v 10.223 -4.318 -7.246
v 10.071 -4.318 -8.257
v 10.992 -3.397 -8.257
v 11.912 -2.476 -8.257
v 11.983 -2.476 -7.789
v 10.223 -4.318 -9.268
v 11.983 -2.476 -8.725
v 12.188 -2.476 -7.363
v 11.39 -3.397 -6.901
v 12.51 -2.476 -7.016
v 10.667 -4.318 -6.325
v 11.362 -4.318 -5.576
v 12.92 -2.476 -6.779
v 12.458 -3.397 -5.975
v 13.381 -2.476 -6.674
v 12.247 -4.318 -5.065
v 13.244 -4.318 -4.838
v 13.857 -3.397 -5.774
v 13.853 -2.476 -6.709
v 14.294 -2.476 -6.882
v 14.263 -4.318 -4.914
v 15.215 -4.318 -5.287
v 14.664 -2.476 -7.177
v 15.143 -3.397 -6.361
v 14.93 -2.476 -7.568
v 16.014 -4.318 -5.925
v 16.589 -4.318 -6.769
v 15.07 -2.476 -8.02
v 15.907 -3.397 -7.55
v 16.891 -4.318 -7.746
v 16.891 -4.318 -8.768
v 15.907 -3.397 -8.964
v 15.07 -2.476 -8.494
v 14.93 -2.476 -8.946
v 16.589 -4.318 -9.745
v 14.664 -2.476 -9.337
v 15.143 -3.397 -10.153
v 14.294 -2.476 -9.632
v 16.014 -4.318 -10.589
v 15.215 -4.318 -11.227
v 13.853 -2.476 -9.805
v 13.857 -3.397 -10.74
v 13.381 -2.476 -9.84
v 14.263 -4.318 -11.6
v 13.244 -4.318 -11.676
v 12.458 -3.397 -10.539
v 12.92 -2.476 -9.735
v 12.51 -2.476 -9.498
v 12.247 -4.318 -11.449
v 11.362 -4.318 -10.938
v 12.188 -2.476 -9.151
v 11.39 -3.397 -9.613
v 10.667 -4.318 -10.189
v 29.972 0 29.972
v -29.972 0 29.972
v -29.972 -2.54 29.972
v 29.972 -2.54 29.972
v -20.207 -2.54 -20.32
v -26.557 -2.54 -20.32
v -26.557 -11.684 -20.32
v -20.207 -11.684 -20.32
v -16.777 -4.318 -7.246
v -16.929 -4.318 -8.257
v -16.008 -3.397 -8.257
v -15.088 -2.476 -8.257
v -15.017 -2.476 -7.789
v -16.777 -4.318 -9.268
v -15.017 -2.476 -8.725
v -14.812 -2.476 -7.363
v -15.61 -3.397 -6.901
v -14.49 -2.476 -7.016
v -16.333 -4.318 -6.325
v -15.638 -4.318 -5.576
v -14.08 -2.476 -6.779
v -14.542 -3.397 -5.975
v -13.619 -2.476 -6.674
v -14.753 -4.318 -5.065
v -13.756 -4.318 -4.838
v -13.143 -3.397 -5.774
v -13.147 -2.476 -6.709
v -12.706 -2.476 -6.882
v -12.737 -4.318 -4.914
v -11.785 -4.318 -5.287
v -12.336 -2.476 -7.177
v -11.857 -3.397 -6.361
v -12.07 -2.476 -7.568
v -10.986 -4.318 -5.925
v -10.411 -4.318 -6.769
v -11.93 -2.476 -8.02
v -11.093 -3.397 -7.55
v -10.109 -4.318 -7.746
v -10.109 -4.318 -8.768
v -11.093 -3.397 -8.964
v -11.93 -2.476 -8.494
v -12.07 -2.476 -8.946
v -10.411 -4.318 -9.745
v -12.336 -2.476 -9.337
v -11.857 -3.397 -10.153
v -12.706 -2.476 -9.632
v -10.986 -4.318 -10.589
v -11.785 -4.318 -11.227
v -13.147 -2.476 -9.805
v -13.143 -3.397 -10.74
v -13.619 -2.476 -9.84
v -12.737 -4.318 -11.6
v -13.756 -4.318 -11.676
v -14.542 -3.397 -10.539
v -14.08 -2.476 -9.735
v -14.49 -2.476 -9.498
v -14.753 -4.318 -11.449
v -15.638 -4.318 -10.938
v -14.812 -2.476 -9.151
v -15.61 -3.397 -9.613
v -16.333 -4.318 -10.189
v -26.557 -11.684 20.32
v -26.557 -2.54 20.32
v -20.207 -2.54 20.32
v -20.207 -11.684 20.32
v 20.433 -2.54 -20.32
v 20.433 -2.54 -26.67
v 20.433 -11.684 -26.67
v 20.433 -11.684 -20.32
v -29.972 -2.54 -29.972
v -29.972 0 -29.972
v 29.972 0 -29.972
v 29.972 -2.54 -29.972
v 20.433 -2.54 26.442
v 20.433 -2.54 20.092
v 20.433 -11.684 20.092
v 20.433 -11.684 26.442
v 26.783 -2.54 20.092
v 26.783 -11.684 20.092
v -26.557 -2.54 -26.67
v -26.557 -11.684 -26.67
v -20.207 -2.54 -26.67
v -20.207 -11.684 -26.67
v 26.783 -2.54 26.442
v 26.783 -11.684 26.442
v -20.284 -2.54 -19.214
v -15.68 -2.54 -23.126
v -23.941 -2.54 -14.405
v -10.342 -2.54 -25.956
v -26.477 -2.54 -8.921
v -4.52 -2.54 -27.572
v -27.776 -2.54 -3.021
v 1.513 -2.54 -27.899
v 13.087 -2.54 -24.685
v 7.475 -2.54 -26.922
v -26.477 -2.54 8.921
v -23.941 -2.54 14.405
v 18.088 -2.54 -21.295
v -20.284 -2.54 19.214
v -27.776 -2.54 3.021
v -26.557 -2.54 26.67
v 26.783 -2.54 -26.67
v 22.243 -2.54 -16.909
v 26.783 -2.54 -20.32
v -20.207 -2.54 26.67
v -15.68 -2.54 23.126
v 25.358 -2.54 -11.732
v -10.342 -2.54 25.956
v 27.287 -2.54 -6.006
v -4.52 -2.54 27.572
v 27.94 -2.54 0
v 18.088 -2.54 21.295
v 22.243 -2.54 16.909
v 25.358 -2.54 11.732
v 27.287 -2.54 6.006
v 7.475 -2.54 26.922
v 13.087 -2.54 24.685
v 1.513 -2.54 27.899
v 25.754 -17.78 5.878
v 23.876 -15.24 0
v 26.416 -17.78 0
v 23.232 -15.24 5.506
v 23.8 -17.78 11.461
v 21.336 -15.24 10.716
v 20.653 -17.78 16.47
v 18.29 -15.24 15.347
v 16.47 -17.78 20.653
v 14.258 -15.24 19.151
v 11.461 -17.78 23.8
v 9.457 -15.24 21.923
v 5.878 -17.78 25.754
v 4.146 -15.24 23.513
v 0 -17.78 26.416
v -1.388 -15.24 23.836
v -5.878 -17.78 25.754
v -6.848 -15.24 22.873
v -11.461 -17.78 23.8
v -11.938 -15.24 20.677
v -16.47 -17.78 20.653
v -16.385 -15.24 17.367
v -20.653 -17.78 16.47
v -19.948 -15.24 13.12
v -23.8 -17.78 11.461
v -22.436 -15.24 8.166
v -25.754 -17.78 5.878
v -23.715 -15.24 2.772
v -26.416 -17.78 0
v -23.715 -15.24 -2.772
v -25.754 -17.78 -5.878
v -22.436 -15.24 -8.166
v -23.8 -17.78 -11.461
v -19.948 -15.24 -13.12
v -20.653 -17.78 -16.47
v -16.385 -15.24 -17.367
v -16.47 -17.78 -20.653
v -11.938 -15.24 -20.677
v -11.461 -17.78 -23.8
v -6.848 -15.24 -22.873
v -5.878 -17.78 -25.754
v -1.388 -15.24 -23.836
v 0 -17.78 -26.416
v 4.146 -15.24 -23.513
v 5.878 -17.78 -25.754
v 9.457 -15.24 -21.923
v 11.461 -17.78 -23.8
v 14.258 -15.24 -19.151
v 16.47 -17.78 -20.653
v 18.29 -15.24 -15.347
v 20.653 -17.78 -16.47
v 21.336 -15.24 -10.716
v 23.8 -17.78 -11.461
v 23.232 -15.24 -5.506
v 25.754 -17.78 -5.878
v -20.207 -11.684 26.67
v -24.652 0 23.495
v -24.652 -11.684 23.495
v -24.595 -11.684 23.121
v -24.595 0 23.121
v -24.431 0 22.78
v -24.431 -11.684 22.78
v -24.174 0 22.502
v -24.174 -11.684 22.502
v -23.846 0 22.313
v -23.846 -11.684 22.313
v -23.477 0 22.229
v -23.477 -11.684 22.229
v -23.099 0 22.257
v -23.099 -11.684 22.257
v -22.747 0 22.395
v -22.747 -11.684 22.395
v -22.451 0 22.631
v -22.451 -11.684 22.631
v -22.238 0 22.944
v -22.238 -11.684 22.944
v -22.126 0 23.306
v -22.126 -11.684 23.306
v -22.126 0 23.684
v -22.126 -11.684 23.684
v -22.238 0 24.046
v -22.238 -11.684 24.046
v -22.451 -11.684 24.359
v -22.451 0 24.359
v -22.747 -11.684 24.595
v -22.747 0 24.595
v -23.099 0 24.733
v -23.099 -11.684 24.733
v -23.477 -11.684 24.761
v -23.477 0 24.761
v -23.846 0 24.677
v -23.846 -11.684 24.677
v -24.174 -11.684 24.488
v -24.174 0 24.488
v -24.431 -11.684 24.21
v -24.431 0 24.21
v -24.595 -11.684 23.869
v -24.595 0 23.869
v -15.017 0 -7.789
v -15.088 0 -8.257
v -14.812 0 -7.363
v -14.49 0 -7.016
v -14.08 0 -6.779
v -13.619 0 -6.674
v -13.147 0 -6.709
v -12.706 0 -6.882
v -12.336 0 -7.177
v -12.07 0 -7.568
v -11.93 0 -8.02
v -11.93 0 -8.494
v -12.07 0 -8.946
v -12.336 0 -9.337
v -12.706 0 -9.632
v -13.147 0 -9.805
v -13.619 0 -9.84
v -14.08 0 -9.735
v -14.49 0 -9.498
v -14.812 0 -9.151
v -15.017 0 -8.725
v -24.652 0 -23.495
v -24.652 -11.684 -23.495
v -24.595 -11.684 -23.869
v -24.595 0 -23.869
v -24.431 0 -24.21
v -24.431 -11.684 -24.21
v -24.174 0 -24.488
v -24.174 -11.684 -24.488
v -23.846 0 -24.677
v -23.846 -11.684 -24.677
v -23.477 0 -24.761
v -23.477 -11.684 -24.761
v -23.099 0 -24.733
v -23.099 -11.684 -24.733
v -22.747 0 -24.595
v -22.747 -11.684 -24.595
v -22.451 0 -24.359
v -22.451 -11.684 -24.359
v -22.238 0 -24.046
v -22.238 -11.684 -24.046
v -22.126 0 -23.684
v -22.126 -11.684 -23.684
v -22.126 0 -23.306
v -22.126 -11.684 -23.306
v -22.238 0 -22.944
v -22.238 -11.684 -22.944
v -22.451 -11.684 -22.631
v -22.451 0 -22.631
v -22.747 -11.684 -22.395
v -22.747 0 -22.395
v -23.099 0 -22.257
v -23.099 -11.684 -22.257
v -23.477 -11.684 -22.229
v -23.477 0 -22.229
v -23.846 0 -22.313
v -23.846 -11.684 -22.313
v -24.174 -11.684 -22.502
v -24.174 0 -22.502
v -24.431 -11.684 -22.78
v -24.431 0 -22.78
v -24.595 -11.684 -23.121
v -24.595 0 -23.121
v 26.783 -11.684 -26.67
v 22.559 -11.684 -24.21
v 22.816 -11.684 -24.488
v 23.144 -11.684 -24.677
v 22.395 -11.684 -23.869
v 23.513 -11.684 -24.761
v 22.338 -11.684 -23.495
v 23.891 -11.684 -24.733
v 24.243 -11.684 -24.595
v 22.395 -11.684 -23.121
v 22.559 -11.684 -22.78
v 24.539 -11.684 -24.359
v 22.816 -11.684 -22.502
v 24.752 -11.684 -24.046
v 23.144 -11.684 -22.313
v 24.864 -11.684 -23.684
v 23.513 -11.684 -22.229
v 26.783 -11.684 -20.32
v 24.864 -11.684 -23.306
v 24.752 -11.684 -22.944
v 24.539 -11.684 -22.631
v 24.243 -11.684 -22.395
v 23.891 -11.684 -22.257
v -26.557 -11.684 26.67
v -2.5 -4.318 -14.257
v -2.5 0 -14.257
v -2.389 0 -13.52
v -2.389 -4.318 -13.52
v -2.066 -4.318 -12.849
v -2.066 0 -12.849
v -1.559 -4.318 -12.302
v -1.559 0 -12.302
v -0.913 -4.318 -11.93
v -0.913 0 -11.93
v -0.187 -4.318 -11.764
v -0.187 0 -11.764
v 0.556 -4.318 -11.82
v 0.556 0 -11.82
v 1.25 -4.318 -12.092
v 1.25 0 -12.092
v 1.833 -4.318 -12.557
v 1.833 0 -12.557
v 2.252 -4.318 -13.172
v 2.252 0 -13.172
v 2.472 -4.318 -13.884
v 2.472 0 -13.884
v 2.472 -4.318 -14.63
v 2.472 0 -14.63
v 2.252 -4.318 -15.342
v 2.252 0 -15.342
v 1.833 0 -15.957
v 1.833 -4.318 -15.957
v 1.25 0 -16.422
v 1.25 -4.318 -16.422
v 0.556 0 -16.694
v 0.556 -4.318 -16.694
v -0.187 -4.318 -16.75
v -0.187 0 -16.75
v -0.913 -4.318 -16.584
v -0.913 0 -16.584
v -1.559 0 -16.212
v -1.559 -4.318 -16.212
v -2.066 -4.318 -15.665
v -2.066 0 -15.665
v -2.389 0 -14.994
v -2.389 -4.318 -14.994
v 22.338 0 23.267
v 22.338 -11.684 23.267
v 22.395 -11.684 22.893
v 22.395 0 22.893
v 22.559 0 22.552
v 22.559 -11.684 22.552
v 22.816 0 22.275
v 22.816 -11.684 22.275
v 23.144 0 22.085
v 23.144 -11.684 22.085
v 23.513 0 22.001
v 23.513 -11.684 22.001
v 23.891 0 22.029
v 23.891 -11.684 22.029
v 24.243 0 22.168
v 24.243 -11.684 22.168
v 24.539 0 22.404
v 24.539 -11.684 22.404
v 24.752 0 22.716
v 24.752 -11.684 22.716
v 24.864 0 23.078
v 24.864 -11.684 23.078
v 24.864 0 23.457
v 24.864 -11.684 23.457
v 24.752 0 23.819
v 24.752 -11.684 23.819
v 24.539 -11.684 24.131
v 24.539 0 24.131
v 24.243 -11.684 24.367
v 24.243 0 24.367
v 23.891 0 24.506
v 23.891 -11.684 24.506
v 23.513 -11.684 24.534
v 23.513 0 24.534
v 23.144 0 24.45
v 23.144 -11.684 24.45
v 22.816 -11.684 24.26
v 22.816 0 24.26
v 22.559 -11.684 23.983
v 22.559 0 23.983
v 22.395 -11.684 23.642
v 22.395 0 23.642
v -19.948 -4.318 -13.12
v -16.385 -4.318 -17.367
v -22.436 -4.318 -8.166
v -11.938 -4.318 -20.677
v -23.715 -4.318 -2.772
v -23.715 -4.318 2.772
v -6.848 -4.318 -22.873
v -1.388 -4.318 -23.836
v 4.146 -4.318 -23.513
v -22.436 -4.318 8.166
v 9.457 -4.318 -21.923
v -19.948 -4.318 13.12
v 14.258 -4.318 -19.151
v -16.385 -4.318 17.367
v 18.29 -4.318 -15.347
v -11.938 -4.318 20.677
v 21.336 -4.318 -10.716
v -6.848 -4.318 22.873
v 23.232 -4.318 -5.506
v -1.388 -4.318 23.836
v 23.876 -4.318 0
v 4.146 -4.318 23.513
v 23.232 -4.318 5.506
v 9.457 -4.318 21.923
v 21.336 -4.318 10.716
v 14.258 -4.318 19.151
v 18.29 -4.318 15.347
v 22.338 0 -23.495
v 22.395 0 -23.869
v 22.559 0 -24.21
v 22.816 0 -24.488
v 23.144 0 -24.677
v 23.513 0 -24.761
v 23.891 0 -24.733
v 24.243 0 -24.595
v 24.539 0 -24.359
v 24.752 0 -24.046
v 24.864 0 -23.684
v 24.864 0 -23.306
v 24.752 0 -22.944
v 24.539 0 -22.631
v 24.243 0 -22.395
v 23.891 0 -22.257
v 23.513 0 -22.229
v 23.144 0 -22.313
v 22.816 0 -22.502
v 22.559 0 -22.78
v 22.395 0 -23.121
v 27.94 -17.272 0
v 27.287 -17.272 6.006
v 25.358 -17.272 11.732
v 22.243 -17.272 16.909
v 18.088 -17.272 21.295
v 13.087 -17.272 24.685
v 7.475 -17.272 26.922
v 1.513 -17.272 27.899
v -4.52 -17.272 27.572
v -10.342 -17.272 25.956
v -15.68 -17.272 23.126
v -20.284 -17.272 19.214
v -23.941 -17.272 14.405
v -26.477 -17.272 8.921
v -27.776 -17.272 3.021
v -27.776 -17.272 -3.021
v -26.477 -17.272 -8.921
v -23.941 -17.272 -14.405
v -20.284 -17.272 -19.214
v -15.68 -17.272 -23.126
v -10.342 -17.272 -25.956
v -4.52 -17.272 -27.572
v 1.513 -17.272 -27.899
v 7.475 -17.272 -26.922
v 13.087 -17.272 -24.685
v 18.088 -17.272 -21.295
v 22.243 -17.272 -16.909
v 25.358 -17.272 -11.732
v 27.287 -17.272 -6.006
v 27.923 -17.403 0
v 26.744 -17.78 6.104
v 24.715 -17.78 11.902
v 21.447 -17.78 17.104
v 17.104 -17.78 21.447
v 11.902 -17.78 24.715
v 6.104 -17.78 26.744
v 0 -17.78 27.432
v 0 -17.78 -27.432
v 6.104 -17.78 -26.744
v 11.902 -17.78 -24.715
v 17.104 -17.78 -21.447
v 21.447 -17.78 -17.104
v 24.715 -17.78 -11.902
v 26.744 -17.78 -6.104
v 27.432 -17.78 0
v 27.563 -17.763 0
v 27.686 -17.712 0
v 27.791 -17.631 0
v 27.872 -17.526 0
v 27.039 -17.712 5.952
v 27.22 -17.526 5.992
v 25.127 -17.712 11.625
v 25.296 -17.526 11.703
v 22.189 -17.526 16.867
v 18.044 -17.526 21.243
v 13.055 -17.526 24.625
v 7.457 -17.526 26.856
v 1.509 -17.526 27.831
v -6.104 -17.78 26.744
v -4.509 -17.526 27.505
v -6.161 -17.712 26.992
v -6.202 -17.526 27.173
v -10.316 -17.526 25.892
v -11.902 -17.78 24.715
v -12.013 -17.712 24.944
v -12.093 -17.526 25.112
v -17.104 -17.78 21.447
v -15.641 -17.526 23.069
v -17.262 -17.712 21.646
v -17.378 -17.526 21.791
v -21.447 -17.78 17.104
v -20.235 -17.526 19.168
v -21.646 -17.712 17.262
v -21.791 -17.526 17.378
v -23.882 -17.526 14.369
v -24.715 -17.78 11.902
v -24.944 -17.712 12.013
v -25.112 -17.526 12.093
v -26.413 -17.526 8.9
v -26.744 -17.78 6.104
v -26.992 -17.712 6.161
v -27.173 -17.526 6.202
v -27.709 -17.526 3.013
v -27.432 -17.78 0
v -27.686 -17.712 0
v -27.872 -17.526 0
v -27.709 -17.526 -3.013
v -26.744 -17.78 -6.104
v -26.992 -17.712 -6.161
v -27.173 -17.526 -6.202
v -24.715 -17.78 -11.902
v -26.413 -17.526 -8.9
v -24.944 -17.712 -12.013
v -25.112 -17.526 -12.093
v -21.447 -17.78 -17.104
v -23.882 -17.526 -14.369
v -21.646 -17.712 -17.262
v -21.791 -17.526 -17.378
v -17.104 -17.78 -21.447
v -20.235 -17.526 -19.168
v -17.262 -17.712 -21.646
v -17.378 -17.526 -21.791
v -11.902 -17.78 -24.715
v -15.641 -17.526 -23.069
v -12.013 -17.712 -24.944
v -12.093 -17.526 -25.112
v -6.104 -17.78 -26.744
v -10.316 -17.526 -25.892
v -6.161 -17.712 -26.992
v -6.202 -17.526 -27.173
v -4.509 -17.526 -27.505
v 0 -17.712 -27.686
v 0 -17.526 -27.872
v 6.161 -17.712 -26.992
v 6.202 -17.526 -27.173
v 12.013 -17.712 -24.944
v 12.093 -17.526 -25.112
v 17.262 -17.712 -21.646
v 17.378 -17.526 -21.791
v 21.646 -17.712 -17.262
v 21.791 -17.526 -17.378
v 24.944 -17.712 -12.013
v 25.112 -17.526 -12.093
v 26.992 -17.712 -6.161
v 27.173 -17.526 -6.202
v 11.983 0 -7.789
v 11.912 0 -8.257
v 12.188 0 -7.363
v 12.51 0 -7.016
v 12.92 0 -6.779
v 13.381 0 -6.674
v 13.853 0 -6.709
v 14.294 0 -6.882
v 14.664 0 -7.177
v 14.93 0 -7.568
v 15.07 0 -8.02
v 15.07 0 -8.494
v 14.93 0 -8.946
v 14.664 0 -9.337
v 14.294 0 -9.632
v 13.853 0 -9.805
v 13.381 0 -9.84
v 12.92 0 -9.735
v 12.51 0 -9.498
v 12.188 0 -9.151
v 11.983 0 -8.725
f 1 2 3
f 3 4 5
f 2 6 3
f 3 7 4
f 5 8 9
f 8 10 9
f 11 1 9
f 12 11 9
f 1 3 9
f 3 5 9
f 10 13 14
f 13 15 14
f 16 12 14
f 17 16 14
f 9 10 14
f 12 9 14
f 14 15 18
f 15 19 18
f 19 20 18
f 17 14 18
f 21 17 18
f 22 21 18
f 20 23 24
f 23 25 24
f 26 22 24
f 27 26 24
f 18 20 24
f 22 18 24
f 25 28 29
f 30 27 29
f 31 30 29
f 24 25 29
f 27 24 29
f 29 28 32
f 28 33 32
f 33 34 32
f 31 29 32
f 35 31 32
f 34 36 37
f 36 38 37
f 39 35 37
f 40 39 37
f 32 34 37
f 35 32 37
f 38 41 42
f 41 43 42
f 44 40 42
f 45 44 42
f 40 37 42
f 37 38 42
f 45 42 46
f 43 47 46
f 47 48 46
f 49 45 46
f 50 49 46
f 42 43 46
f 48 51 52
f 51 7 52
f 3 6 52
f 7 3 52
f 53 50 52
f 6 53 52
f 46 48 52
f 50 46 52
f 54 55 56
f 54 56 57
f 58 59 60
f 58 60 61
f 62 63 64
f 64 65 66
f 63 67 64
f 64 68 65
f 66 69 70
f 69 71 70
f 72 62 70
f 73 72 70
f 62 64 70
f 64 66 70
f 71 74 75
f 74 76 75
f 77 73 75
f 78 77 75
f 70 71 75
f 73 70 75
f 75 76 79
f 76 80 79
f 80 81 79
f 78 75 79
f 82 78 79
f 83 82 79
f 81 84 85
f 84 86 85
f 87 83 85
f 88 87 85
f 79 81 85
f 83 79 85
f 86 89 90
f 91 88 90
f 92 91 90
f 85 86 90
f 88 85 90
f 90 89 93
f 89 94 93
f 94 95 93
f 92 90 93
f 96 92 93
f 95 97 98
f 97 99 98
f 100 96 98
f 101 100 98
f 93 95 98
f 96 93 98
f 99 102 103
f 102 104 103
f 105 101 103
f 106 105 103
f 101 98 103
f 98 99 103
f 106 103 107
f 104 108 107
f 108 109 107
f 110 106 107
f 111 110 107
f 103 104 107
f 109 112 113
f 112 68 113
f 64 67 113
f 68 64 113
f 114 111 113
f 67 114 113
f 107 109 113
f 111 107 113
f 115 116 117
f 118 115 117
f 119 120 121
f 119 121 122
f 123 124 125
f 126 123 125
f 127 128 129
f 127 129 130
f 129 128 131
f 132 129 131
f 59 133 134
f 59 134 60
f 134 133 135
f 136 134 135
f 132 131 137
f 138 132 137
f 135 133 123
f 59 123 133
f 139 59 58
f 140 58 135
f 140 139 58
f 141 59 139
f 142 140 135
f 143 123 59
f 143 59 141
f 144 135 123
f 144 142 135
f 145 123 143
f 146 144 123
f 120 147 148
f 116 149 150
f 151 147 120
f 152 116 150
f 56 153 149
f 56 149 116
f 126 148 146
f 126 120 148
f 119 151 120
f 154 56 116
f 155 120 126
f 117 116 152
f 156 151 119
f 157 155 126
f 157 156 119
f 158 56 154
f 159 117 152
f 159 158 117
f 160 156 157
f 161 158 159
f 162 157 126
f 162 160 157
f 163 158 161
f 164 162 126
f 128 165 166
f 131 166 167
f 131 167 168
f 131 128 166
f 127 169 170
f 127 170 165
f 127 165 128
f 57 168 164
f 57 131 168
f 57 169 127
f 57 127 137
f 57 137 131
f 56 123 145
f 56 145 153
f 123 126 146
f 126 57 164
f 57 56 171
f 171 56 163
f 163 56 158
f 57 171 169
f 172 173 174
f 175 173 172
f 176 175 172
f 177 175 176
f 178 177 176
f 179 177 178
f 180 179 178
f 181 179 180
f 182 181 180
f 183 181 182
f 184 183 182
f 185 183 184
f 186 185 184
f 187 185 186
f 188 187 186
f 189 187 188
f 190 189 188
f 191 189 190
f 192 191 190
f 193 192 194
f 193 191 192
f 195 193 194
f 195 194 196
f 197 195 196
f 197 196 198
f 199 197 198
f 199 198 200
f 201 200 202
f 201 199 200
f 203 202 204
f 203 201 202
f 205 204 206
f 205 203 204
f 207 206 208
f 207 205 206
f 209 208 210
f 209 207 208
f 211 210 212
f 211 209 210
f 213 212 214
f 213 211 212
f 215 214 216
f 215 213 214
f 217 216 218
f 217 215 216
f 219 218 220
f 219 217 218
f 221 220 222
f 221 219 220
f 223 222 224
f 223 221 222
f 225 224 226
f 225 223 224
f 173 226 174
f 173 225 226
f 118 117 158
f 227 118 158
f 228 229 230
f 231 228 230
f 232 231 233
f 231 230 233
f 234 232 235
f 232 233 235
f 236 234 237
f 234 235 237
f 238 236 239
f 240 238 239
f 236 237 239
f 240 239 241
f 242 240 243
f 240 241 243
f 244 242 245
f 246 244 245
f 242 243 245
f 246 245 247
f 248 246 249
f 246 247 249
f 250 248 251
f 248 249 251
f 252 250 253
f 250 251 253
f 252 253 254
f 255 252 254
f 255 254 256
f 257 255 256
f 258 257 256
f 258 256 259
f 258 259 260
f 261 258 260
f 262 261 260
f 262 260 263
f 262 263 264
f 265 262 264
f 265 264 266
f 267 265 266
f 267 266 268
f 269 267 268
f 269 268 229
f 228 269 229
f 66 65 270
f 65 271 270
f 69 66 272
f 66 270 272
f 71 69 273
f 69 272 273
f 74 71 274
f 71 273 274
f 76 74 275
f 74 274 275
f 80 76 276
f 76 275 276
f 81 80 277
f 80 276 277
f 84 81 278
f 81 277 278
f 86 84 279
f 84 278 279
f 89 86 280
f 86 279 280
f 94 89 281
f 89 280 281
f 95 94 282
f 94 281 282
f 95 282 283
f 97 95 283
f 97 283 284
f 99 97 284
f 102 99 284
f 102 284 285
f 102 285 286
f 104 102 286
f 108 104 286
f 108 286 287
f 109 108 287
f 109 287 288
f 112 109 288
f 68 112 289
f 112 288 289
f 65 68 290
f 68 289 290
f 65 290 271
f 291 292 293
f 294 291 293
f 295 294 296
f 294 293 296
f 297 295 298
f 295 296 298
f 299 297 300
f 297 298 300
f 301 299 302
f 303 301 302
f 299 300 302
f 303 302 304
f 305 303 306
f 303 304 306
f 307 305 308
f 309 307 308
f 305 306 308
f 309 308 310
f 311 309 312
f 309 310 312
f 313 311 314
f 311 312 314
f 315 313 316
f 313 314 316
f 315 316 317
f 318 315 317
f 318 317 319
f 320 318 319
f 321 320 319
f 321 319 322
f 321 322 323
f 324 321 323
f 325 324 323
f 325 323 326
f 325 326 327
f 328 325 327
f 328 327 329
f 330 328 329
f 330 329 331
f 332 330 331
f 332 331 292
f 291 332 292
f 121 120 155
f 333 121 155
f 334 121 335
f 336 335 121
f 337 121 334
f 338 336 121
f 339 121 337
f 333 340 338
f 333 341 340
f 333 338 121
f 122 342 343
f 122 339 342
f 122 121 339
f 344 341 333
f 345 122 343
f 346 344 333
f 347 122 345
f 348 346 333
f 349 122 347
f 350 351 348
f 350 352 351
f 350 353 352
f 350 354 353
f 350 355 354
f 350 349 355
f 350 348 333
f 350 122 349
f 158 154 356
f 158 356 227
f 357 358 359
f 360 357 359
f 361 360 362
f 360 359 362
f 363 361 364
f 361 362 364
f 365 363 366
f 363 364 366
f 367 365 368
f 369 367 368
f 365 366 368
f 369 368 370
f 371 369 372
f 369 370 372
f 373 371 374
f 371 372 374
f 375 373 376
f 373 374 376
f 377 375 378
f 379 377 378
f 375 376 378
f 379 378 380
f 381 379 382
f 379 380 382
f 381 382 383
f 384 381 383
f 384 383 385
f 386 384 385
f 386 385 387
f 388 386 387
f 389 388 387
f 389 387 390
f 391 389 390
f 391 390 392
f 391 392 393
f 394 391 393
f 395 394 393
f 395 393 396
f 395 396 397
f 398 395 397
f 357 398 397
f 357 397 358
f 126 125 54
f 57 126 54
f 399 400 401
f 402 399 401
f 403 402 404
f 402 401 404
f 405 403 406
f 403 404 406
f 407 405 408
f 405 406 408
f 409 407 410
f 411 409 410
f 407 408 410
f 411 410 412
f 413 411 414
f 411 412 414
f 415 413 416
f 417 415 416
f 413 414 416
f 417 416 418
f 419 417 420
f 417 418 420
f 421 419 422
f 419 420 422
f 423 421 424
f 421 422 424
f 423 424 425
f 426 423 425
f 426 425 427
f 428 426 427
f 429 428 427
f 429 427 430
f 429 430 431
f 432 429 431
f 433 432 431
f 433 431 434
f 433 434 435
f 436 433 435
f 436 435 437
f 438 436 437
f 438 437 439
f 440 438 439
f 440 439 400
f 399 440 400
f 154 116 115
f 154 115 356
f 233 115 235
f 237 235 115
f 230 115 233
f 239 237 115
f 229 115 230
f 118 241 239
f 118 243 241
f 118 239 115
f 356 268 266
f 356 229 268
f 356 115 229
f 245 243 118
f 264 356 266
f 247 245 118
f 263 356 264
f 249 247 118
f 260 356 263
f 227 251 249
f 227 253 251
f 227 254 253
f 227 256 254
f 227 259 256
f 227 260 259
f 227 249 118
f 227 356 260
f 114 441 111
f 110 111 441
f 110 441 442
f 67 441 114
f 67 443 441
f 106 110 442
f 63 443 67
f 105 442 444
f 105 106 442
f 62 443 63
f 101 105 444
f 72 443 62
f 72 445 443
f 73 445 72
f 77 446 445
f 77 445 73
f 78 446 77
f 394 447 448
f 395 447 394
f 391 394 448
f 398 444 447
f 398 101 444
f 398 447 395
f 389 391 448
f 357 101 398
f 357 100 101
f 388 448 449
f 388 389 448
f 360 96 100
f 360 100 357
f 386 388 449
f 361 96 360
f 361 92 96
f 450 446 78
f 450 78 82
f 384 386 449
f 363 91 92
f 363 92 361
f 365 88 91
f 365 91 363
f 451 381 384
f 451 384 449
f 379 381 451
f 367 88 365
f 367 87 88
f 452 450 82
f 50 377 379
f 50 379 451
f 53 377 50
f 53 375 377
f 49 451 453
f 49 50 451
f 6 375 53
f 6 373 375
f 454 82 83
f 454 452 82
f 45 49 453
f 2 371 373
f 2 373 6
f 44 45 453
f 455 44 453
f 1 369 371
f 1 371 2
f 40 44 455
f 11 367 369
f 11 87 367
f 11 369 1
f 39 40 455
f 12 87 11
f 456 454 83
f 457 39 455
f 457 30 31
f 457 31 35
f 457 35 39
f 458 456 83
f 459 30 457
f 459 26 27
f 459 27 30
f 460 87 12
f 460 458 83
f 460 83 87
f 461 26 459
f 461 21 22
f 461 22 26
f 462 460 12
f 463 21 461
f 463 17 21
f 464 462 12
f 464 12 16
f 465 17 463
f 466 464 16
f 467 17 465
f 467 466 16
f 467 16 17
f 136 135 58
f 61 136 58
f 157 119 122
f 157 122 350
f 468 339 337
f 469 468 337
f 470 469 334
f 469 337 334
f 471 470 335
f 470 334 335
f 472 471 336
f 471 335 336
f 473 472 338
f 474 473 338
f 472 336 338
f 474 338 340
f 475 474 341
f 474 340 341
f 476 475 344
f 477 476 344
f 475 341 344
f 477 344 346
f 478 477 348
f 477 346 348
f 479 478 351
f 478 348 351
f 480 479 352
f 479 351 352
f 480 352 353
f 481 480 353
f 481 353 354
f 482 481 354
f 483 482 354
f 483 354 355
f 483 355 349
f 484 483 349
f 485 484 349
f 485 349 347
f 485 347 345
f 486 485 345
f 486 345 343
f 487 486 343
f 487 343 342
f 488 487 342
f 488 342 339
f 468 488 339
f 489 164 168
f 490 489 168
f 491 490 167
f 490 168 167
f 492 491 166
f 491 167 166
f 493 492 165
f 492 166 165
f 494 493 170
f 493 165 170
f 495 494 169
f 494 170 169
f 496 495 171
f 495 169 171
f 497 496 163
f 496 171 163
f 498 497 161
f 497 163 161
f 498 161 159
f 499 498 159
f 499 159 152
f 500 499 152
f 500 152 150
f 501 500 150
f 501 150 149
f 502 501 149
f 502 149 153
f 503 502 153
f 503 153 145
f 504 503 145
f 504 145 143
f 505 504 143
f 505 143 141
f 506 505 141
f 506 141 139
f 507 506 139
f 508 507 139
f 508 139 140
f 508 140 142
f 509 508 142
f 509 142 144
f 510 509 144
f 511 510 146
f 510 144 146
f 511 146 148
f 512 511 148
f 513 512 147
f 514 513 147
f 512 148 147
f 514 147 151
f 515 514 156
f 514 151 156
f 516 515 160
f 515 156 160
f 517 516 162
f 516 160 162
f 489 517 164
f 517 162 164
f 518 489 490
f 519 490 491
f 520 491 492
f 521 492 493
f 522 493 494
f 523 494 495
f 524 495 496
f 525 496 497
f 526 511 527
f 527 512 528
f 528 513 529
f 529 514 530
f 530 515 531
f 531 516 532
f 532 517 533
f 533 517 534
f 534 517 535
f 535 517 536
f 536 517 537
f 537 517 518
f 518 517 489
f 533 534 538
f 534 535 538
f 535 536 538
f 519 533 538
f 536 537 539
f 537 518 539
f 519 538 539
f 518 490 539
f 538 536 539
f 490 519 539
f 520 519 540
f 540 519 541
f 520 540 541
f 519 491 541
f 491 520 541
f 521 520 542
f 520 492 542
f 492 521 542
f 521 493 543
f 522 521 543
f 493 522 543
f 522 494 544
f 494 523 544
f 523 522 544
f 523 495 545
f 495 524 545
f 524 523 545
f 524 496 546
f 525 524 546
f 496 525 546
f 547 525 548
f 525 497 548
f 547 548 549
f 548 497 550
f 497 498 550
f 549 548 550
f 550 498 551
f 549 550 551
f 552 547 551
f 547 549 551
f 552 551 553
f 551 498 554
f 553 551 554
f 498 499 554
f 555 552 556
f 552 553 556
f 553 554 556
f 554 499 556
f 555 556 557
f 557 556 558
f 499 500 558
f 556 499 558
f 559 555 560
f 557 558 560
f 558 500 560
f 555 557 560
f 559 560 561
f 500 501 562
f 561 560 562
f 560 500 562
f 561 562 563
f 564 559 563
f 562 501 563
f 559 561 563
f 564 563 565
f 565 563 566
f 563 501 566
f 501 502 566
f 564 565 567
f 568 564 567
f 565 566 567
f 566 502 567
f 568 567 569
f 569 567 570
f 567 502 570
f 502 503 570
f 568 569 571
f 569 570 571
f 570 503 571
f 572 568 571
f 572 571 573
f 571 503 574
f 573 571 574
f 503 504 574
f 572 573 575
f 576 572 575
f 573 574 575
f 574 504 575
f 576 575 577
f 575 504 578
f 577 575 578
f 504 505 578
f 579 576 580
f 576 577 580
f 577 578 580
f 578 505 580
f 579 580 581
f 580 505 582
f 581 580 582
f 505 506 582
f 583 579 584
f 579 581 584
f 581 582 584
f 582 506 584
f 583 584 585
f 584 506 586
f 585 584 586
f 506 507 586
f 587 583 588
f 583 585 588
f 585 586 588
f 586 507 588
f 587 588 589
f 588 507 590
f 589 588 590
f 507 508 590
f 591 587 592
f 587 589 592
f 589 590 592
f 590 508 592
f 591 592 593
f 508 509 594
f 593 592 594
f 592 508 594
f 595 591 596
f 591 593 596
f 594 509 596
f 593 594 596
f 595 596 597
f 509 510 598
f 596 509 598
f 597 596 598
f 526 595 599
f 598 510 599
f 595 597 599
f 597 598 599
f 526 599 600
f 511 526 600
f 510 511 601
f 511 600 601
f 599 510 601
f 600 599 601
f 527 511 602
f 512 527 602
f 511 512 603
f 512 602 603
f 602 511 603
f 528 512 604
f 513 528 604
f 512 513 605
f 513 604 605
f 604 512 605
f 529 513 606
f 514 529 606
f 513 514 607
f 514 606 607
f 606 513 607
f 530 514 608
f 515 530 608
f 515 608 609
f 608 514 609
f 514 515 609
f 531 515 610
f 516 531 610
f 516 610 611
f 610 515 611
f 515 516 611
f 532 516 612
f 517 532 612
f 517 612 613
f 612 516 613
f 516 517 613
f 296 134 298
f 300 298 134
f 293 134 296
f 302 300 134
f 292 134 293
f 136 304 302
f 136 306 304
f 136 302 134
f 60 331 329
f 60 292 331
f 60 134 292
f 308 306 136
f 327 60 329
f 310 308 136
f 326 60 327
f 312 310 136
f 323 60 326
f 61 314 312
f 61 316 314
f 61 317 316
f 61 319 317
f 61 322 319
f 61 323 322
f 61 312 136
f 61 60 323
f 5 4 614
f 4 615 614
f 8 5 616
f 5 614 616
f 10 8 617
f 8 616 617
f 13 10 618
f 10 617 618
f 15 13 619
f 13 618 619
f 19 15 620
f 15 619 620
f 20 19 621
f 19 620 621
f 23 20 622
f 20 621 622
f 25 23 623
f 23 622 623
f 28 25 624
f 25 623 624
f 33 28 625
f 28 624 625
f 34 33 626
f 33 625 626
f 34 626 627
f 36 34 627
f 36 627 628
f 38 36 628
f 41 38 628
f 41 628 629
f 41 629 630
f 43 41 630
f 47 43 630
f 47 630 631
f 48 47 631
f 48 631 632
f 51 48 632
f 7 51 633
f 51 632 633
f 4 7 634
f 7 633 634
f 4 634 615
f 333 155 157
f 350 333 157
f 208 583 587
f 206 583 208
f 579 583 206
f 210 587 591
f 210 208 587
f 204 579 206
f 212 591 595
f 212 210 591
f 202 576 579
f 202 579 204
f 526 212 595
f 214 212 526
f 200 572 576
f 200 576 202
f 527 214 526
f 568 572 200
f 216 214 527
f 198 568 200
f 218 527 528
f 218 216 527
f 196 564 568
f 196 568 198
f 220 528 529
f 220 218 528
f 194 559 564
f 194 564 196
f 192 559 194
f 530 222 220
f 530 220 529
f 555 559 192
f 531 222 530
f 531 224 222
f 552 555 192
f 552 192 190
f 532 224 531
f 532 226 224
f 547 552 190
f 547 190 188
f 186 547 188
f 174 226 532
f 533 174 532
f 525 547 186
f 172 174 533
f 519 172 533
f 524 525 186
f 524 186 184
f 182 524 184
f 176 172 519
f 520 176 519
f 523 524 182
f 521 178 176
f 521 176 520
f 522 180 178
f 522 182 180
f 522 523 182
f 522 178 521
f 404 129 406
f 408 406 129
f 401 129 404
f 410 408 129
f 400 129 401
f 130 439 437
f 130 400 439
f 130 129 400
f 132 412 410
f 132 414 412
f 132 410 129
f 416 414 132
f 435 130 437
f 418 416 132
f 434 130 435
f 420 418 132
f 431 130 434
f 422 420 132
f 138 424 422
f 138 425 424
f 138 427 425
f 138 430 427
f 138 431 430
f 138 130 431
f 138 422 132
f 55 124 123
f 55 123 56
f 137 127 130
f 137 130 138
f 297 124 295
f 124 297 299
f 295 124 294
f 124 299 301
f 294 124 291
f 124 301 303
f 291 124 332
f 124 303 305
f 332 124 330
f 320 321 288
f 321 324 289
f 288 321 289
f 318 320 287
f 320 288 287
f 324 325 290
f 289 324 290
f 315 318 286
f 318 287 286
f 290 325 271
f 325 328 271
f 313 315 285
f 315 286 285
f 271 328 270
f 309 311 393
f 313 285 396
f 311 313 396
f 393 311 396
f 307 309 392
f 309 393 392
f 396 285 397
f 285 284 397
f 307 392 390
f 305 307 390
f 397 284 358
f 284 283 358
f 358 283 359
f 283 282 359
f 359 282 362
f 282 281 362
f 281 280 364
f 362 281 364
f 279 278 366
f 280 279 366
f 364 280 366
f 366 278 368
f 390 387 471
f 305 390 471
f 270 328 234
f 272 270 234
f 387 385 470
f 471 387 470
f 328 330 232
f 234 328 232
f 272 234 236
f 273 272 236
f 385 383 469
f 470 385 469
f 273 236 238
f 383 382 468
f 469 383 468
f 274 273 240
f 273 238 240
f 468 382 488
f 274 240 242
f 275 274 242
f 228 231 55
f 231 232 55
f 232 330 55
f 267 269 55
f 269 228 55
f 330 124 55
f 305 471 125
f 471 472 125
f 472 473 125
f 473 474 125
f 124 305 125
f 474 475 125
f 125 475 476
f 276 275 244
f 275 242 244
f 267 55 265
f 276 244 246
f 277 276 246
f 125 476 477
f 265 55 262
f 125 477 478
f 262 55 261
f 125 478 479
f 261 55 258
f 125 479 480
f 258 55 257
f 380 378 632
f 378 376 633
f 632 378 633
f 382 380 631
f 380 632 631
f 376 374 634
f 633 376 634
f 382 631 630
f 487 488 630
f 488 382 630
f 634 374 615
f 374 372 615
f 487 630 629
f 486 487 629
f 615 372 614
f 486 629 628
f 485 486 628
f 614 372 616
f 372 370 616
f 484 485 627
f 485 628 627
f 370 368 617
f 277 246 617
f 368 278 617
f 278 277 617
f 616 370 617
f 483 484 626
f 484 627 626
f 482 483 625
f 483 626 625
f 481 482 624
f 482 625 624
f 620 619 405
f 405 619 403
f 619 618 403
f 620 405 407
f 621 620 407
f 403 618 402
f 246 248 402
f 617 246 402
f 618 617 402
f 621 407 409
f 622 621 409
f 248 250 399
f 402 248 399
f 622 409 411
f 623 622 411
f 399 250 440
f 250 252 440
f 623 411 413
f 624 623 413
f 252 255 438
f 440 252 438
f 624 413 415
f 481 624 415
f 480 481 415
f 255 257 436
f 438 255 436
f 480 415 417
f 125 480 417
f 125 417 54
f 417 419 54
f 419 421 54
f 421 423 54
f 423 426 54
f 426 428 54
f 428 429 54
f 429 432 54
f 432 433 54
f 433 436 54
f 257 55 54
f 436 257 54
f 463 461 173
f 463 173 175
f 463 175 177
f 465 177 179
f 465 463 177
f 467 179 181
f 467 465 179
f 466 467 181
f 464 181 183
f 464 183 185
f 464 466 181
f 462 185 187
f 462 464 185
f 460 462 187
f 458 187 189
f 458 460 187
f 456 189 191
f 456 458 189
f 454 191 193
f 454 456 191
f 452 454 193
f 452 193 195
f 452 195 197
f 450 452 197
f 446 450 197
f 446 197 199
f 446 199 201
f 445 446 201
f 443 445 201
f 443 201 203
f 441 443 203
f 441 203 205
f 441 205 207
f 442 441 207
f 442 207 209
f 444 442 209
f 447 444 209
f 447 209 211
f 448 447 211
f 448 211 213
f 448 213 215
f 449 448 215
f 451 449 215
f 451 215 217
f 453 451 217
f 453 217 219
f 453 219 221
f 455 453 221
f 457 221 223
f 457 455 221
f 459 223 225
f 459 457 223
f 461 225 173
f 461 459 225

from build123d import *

# Parameters (mm, degrees)
F0_R            = 24.257
F1_DEPTH        = 4.318
F2_R            = 27.94
F2_R_2          = 23.876
F3_DEPTH        = 17.78
F0_W            = 59.944
F0_H            = 59.944
F0_W_2          = 6.35
F0_H_2          = 6.35
F5_DEPTH        = 2.54
F6_DEPTH        = 11.684
F7_D            = 2.54
F8_SIZE         = 2.54
F9_R            = 0.508
F11_D           = 3.175
F11_CSINK_D     = 6.858
F11_CSINK_ANGLE = 90
F12_D           = 5


with BuildPart() as f1:
    # F0 (on Front) → F1 (new body)
    with BuildSketch(Plane.XZ):
        Circle(F0_R)
    extrude(amount=F1_DEPTH)

    # F2 (on Front) → F3 (join)
    with BuildSketch(Plane.XZ):
        Circle(F2_R)
        Circle(F2_R_2, mode=Mode.SUBTRACT)
    extrude(amount=F3_DEPTH)

    # F0 (on Front) → F5 (join)
    with BuildSketch(Plane.XZ):
        Rectangle(F0_W, F0_H)
        with Locations((-23.3818002729, -23.495)):
            Rectangle(F0_W_2, F0_H_2, mode=Mode.SUBTRACT)
        Circle(F0_R, mode=Mode.SUBTRACT)
        with Locations((23.6081997271, -23.495)):
            Rectangle(F0_W_2, F0_H_2, mode=Mode.SUBTRACT)
        with Locations((-23.3818002729, 23.495)):
            Rectangle(F0_W_2, F0_H_2, mode=Mode.SUBTRACT)
        with Locations((23.6081997271, 23.2674991059)):
            Rectangle(F0_W_2, F0_H_2, mode=Mode.SUBTRACT)
    extrude(amount=F5_DEPTH)

    # F0 (on Front) → F6 (join)
    with BuildSketch(Plane.XZ):
        with Locations((-23.3818002729, -23.495)):
            Rectangle(F0_W_2, F0_H_2)
        with Locations((-23.3818002729, 23.495)):
            Rectangle(F0_W_2, F0_H_2)
        with Locations((23.6081997271, 23.2674991059)):
            Rectangle(F0_W_2, F0_H_2)
        with Locations((23.6081997271, -23.495)):
            Rectangle(F0_W_2, F0_H_2)
    extrude(amount=F6_DEPTH)

    # F7 (through all)
    with Locations(Plane(origin=(0, 0, 0), x_dir=(1, 0, 0), z_dir=(0, 1, 0))):
        with Locations((-23.3818002729, -23.495), (23.6081997271, -23.2674991059), (-23.3818002729, 23.495), (23.6081997271, 23.495)):
            Hole(F7_D / 2)

    # F8
    f8_edges = [f1.edges().sort_by_distance(p)[0] for p in [
        (-23.876, -17.78, 0),
    ]]
    chamfer(f8_edges, length=F8_SIZE)

    # F9
    f9_edges = [f1.edges().sort_by_distance(p)[0] for p in [
        (-27.94, -17.78, 0),
    ]]
    fillet(f9_edges, radius=F9_R)

    # F11 (through all)
    with Locations(Plane.XZ.offset(4.318)):
        with Locations((-13.5, -8.257), (13.5, -8.257)):
            CounterSinkHole(F11_D / 2, F11_CSINK_D / 2, counter_sink_angle=F11_CSINK_ANGLE)

    # F12 (through all)
    with Locations(Plane.XZ.offset(4.318)):
        with Locations((0, -14.257)):
            Hole(F12_D / 2)


solid = f1.part
